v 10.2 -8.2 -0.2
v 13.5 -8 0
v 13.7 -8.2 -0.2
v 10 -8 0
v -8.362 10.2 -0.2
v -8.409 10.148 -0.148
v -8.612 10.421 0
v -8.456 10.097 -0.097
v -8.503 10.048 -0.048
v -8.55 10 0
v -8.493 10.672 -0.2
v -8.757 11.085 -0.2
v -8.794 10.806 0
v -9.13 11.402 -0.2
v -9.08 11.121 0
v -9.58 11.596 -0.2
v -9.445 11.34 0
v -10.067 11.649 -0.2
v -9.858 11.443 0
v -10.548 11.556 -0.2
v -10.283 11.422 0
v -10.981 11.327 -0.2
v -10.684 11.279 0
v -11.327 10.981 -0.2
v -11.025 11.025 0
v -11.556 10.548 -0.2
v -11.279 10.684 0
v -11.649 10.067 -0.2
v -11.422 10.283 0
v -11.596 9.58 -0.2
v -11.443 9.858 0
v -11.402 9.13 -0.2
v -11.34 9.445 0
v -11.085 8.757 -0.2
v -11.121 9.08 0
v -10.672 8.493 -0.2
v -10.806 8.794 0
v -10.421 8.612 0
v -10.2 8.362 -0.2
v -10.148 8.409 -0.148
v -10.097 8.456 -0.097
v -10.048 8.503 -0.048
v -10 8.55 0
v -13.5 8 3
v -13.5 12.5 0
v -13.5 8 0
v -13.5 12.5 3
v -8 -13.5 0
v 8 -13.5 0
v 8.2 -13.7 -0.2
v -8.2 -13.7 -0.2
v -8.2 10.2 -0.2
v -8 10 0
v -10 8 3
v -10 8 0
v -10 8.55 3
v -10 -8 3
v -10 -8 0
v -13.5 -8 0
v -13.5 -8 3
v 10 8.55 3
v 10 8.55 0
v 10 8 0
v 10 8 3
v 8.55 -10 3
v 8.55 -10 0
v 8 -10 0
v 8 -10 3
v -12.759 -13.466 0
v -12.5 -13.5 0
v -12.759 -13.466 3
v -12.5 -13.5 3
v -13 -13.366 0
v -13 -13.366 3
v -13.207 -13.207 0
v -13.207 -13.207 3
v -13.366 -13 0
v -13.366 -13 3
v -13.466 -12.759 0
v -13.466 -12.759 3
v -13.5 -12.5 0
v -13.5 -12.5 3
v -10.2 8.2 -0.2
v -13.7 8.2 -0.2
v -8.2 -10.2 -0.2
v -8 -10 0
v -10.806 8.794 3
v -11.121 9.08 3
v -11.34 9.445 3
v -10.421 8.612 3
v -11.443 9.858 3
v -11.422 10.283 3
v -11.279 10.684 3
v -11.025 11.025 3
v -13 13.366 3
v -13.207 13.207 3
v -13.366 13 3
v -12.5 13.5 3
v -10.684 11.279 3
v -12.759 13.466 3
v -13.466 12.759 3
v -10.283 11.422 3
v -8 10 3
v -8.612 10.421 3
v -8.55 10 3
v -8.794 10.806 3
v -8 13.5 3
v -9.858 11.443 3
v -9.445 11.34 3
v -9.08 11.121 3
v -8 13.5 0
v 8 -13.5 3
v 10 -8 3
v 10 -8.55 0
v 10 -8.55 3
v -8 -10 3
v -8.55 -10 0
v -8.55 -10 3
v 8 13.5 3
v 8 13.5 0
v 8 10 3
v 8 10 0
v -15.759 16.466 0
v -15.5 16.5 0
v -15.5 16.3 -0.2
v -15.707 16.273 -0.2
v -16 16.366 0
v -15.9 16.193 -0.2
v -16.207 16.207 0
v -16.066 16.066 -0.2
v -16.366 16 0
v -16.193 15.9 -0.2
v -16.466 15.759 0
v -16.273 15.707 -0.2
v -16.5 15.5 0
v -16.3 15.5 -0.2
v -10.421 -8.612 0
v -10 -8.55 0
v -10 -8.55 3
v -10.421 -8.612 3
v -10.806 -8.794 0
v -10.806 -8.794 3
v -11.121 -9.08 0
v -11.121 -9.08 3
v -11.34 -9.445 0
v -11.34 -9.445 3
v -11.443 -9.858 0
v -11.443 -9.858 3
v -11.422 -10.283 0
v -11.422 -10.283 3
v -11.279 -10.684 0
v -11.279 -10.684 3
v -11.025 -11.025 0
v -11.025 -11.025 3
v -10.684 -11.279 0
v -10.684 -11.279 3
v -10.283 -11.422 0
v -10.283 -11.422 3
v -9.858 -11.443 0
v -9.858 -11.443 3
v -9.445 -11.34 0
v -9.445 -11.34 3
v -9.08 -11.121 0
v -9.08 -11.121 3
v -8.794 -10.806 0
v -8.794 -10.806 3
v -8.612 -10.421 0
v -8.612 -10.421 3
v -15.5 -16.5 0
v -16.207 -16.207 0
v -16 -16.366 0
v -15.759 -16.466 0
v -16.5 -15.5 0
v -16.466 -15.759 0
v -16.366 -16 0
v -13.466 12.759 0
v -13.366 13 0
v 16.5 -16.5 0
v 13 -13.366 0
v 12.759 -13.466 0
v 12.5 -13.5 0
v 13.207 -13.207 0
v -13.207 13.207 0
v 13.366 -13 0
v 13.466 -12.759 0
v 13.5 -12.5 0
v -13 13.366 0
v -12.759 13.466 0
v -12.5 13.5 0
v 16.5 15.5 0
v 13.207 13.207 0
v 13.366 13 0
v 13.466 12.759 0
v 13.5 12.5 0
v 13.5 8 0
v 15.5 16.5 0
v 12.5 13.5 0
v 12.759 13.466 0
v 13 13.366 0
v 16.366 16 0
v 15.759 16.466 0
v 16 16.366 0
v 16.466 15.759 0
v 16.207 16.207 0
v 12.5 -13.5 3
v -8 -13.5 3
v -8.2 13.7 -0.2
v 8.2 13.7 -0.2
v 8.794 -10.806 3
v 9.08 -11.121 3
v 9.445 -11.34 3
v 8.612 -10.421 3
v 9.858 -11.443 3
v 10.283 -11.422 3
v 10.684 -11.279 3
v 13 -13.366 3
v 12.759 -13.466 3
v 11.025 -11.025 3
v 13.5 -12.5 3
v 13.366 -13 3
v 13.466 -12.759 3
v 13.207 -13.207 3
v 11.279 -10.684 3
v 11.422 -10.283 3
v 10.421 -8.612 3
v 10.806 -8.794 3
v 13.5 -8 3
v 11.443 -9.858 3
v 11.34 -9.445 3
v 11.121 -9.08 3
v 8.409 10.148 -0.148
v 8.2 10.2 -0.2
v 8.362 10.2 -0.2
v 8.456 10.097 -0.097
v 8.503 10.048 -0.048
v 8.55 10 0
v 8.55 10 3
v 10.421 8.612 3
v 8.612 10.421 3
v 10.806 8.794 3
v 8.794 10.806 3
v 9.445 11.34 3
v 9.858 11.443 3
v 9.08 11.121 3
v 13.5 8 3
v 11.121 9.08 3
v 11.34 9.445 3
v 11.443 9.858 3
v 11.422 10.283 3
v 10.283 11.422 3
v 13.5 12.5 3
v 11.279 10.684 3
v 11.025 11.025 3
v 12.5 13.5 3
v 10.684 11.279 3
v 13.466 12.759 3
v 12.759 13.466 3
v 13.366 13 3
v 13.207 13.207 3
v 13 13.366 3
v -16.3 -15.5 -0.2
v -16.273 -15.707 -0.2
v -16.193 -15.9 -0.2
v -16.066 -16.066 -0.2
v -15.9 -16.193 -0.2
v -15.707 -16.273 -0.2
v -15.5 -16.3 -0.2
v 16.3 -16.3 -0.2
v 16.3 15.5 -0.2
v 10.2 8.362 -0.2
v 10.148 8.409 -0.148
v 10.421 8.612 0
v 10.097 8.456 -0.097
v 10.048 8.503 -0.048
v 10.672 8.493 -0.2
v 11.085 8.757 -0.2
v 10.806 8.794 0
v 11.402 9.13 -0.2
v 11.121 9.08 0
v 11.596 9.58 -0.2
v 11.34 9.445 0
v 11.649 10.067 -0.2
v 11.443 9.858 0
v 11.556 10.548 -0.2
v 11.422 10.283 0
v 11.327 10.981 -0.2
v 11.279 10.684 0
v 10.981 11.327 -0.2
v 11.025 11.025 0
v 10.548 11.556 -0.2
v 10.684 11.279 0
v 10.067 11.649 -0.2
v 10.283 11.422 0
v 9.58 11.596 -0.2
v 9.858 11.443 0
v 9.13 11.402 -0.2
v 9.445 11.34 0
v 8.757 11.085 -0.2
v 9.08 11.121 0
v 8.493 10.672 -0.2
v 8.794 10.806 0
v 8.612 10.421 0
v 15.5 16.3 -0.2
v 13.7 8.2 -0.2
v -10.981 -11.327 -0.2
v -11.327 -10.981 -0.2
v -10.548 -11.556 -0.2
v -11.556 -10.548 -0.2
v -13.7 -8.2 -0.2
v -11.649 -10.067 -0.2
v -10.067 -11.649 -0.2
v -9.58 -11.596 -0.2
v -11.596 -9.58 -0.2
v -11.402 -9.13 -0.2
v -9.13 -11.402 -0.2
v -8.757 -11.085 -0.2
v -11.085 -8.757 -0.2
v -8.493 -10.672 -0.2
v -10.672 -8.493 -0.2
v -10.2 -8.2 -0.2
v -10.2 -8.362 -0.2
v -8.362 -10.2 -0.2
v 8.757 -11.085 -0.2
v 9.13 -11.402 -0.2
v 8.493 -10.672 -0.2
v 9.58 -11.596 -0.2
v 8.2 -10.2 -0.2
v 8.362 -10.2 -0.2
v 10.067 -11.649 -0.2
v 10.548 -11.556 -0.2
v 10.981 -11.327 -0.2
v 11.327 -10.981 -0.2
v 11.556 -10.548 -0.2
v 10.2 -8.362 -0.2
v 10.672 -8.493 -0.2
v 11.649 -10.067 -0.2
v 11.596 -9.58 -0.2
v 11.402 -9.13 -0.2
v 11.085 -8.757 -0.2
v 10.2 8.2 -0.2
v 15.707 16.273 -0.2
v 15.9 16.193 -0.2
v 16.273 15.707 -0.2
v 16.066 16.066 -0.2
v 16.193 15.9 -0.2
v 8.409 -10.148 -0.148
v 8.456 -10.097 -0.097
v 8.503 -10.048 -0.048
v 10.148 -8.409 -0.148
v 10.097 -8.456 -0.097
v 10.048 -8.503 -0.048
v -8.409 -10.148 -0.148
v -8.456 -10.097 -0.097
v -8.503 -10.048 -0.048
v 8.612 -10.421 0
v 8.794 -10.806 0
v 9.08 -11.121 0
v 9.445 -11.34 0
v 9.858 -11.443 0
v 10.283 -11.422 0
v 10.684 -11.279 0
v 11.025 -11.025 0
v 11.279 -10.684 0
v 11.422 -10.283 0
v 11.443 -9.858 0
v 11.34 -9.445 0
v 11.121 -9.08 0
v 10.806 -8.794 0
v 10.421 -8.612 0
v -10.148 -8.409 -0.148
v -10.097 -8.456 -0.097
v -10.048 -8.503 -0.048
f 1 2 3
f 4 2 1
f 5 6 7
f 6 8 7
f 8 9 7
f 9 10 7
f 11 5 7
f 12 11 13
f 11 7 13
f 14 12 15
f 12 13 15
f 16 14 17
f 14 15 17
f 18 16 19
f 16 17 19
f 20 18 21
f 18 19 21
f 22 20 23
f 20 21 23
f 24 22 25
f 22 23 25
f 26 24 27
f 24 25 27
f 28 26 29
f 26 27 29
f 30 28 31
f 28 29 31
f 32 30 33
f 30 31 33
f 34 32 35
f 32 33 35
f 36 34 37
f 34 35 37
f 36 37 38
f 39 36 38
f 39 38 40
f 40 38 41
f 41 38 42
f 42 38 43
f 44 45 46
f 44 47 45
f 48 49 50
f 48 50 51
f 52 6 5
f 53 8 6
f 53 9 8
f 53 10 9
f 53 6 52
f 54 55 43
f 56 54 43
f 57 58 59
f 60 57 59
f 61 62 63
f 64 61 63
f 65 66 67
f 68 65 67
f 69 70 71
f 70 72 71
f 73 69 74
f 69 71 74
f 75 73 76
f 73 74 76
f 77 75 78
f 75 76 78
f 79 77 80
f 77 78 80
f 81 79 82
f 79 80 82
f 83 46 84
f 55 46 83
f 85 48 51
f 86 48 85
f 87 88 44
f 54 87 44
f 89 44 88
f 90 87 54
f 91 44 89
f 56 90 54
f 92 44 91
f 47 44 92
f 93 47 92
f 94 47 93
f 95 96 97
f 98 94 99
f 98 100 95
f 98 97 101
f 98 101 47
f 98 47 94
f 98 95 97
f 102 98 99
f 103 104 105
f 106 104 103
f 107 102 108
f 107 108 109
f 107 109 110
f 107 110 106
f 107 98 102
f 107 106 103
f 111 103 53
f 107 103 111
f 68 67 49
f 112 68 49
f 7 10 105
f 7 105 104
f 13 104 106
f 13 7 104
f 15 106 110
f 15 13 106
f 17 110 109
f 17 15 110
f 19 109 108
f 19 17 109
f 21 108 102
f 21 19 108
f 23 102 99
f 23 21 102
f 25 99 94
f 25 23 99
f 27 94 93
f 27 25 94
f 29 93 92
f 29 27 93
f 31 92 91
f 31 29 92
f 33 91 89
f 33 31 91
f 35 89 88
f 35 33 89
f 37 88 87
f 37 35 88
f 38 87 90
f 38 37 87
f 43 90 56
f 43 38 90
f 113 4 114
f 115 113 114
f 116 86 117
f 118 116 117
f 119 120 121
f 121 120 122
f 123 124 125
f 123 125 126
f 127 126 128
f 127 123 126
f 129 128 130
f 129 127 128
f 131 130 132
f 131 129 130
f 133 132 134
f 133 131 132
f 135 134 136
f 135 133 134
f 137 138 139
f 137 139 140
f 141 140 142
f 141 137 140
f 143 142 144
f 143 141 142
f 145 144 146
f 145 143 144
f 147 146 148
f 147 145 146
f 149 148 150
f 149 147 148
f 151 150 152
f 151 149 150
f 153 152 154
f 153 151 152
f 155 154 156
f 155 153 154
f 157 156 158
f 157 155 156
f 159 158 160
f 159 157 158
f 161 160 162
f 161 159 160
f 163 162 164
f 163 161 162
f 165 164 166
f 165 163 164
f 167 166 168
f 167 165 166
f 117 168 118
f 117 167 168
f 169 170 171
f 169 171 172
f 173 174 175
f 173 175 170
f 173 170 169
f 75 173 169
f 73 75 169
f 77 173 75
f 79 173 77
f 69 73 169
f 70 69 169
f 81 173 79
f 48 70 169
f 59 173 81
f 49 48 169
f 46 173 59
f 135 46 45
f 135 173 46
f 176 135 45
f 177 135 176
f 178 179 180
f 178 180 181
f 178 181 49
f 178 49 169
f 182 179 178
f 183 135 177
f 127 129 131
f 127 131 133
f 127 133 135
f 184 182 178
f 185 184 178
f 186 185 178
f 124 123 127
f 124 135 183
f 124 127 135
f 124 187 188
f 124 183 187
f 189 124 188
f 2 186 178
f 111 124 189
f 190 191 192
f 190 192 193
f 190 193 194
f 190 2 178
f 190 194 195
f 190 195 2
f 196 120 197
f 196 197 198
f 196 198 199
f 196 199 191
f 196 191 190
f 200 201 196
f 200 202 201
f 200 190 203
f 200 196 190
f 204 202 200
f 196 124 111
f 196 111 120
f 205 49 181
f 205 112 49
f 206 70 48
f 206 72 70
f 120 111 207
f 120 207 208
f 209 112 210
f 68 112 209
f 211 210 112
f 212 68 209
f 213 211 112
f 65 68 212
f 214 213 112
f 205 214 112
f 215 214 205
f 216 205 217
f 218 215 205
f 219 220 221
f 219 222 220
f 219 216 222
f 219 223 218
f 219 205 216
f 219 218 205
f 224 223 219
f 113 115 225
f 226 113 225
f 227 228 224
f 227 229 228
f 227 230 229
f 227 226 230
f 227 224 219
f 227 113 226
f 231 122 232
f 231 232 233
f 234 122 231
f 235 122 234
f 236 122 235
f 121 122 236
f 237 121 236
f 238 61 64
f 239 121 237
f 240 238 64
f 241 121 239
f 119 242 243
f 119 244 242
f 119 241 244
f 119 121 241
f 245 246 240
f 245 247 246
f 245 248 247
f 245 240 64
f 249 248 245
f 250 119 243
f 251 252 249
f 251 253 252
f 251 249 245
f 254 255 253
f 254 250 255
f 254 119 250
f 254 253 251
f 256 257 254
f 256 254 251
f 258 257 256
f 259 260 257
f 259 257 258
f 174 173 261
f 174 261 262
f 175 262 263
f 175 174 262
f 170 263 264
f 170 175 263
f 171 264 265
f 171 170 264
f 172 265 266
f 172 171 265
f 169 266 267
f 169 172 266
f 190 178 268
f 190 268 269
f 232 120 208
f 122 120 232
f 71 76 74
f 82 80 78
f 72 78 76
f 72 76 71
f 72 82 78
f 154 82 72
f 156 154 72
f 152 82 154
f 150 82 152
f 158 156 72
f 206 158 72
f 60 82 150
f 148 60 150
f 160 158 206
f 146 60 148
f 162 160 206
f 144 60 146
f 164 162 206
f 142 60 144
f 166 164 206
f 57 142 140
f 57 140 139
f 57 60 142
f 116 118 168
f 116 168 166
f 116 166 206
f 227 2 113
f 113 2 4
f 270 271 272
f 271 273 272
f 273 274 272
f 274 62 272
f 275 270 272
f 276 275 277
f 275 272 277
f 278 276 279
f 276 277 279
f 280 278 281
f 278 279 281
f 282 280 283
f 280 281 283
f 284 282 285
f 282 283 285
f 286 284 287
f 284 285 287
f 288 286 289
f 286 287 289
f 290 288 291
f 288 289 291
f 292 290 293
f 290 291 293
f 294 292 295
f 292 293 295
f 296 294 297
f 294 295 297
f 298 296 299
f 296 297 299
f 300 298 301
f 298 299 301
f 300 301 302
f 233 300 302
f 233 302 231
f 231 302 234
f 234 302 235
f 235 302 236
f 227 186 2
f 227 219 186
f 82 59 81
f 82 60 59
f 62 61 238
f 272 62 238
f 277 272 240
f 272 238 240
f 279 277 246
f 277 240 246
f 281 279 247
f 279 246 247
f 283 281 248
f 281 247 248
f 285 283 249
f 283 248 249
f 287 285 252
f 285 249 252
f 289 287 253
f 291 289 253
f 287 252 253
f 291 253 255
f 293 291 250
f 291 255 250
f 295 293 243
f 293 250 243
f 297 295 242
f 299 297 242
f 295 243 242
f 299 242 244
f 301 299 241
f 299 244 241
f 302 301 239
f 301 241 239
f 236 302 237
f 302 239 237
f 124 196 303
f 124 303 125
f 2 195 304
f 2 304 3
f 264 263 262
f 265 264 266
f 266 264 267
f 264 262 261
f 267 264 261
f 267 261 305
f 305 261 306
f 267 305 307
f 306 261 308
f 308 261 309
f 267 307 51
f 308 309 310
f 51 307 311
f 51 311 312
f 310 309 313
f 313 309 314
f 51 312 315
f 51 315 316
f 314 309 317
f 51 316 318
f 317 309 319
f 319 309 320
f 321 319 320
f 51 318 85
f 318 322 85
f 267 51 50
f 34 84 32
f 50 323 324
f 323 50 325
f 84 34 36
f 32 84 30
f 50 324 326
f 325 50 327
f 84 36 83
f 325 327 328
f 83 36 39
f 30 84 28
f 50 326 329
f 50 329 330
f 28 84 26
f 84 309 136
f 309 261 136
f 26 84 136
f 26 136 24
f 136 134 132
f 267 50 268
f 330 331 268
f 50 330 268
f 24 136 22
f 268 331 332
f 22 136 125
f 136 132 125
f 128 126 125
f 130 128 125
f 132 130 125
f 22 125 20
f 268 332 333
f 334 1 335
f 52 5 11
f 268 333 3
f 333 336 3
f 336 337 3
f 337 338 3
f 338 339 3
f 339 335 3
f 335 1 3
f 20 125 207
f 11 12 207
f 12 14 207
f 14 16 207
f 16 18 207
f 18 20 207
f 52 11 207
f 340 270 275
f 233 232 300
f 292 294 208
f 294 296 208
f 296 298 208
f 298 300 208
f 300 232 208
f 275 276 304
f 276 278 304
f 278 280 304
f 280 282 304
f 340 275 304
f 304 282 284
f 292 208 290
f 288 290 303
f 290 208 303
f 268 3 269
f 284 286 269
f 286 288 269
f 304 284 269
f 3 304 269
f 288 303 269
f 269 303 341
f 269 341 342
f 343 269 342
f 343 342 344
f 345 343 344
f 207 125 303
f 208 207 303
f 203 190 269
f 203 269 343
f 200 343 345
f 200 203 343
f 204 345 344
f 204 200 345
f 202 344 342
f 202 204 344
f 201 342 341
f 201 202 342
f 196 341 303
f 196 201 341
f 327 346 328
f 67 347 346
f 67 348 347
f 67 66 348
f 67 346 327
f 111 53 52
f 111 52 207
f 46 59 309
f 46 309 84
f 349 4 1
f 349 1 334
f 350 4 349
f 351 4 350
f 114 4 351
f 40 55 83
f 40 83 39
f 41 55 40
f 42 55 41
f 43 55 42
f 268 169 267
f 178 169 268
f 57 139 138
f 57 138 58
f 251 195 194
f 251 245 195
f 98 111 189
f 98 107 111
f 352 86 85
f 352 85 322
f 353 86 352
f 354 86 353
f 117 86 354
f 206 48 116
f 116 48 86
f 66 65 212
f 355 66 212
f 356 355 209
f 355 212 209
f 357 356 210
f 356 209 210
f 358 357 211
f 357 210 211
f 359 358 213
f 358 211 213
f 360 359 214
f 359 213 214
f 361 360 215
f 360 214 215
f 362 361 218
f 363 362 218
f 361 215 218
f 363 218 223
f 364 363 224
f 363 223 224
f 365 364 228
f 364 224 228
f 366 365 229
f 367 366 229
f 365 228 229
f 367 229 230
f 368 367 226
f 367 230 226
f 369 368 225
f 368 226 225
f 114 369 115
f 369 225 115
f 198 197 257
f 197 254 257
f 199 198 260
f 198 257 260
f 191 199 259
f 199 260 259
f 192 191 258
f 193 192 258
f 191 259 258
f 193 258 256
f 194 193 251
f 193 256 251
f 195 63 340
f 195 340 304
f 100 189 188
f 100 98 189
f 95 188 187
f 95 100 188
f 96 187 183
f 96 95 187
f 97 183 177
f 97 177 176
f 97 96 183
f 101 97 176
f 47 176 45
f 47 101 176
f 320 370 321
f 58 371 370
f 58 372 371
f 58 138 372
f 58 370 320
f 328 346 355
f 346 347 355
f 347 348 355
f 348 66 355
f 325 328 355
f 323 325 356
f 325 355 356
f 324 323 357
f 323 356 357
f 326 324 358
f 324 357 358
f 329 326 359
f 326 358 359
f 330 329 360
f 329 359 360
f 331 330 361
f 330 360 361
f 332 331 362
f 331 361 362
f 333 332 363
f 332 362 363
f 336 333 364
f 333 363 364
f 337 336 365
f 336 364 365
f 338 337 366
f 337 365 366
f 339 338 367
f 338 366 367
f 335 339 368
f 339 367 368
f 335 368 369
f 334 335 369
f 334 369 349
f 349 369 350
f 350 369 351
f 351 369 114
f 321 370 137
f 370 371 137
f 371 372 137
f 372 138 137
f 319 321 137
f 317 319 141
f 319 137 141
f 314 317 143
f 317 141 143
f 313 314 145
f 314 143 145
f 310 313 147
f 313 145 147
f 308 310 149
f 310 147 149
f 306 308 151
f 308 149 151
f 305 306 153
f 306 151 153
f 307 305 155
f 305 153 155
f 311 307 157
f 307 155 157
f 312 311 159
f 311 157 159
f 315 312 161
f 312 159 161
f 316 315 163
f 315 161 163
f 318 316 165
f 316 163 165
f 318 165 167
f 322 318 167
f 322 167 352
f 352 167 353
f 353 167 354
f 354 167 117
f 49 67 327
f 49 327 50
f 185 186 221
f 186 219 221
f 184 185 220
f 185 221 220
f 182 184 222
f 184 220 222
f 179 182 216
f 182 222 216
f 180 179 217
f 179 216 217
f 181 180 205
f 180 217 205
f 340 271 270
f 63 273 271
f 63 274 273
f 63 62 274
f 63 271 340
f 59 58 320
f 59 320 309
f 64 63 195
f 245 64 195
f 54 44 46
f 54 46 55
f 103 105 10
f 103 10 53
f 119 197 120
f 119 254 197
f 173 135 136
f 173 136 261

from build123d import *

# Parameters (mm, degrees)
F1_R          = 1.45
F6_DEPTH      = 0.201
F6_DEPTH_BACK = 3.001
F7_R          = 1
F8_SIZE       = 0.19999


# Not quite as in the source:
# - a fillet or chamfer is up to 0.001 mm smaller than in the source, because OpenCascade refuses the exact size


with BuildPart() as f4:
    # F4: sweep along a path in F2
    with BuildLine(Plane.XZ) as f4_path:
        Line((0, 0), (0, -0.2))
    # F3 (on Top) → F4 (sweep)
    with BuildSketch(Plane.XY):
        Polygon((16.5, 16.5), (0, 16.5), (-16.5, 16.5), (-16.5, 0), (-16.5, -16.5), (0, -16.5), (16.5, -16.5), (16.5, 0), align=None)
        Polygon((0, 13.5), (8, 13.5), (13.5, 13.5), (13.5, 8), (13.5, 0), (13.5, -8), (13.5, -13.5), (8, -13.5), (0, -13.5), (-8, -13.5), (-13.5, -13.5), (-13.5, -8), (-13.5, 0), (-13.5, 8), (-13.5, 13.5), (-8, 13.5), align=None, mode=Mode.SUBTRACT)
        Polygon((-10, -8), (-13.5, -8), (-13.5, -13.5), (-8, -13.5), (-8, -10), (-10, -10), align=None)
        Polygon((-8, 10), (-8, 13.5), (-13.5, 13.5), (-13.5, 8), (-10, 8), (-10, 10), align=None)
        Polygon((8, 13.5), (8, 10), (10, 10), (10, 8), (13.5, 8), (13.5, 13.5), align=None)
        Polygon((13.5, -13.5), (13.5, -8), (10, -8), (10, -10), (8, -10), (8, -13.5), align=None)
    sweep(path=f4_path.line)

    # F5: sweep along a path in F2
    with BuildLine(Plane.XZ) as f5_path:
        Line((0, 0), (0, 3))
    # F3 (on Top) → F5 (sweep)
    with BuildSketch(Plane.XY):
        Polygon((-8, 10), (-8, 13.5), (-13.5, 13.5), (-13.5, 8), (-10, 8), (-10, 10), align=None)
        Polygon((8, 13.5), (8, 10), (10, 10), (10, 8), (13.5, 8), (13.5, 13.5), align=None)
        Polygon((-10, -8), (-13.5, -8), (-13.5, -13.5), (-8, -13.5), (-8, -10), (-10, -10), align=None)
        Polygon((13.5, -13.5), (13.5, -8), (10, -8), (10, -10), (8, -10), (8, -13.5), align=None)
    sweep(path=f5_path.line)

    # F1 (on Top) → F6 (cut, two sides)
    with BuildSketch(Plane.XY) as f6_sk:
        with Locations((10, 10)):
            Circle(F1_R)
        with Locations((-10, 10)):
            Circle(F1_R)
        with Locations((-10, -10)):
            Circle(F1_R)
        with Locations((10, -10)):
            Circle(F1_R)
    extrude(amount=-F6_DEPTH, mode=Mode.SUBTRACT)
    extrude(f6_sk.sketch, amount=F6_DEPTH_BACK, mode=Mode.SUBTRACT)

    # F7
    f7_edges = [f4.edges().sort_by_distance(p)[0] for p in [
        (16.5, 16.5, -0.1),
        (13.5, -13.5, 1.5),
        (13.5, 13.5, 1.5),
        (-13.5, -13.5, 1.5),
        (-16.5, -16.5, -0.1),
        (-13.5, 13.5, 1.5),
        (-16.5, 16.5, -0.1),
    ]]
    fillet(f7_edges, radius=F7_R)

    # F8 (size 0.2 in the source; OpenCascade refuses exactly that, so slightly less here)
    f8_edges = [f4.edges().sort_by_distance(p)[0] for p in [
        (0, 16.5, -0.2),
        (16.207107, 16.207107, -0.2),
        (-16.207107, 16.207107, -0.2),
        (16.5, -0.5, -0.2),
        (-16.5, 0, -0.2),
        (0.5, -16.5, -0.2),
        (-16.207107, -16.207107, -0.2),
        (-13.5, 0, -0.2),
        (-11.75, 8, -0.2),
        (-10, 8.275, -0.2),
        (-11.025305, 11.025305, -0.2),
        (-8.275, 10, -0.2),
        (-8, 11.75, -0.2),
        (0, 13.5, -0.2),
        (8, 11.75, -0.2),
        (8.275, 10, -0.2),
        (11.025305, 11.025305, -0.2),
        (10, 8.275, -0.2),
        (11.75, 8, -0.2),
        (13.5, 0, -0.2),
        (11.75, -8, -0.2),
        (10, -8.275, -0.2),
        (11.025305, -11.025305, -0.2),
        (8.275, -10, -0.2),
        (8, -11.75, -0.2),
        (0, -13.5, -0.2),
        (-8, -11.75, -0.2),
        (-8.275, -10, -0.2),
        (-11.025305, -11.025305, -0.2),
        (-10, -8.275, -0.2),
        (-11.75, -8, -0.2),
    ]]
    chamfer(f8_edges, length=F8_SIZE)


solid = f4.part
